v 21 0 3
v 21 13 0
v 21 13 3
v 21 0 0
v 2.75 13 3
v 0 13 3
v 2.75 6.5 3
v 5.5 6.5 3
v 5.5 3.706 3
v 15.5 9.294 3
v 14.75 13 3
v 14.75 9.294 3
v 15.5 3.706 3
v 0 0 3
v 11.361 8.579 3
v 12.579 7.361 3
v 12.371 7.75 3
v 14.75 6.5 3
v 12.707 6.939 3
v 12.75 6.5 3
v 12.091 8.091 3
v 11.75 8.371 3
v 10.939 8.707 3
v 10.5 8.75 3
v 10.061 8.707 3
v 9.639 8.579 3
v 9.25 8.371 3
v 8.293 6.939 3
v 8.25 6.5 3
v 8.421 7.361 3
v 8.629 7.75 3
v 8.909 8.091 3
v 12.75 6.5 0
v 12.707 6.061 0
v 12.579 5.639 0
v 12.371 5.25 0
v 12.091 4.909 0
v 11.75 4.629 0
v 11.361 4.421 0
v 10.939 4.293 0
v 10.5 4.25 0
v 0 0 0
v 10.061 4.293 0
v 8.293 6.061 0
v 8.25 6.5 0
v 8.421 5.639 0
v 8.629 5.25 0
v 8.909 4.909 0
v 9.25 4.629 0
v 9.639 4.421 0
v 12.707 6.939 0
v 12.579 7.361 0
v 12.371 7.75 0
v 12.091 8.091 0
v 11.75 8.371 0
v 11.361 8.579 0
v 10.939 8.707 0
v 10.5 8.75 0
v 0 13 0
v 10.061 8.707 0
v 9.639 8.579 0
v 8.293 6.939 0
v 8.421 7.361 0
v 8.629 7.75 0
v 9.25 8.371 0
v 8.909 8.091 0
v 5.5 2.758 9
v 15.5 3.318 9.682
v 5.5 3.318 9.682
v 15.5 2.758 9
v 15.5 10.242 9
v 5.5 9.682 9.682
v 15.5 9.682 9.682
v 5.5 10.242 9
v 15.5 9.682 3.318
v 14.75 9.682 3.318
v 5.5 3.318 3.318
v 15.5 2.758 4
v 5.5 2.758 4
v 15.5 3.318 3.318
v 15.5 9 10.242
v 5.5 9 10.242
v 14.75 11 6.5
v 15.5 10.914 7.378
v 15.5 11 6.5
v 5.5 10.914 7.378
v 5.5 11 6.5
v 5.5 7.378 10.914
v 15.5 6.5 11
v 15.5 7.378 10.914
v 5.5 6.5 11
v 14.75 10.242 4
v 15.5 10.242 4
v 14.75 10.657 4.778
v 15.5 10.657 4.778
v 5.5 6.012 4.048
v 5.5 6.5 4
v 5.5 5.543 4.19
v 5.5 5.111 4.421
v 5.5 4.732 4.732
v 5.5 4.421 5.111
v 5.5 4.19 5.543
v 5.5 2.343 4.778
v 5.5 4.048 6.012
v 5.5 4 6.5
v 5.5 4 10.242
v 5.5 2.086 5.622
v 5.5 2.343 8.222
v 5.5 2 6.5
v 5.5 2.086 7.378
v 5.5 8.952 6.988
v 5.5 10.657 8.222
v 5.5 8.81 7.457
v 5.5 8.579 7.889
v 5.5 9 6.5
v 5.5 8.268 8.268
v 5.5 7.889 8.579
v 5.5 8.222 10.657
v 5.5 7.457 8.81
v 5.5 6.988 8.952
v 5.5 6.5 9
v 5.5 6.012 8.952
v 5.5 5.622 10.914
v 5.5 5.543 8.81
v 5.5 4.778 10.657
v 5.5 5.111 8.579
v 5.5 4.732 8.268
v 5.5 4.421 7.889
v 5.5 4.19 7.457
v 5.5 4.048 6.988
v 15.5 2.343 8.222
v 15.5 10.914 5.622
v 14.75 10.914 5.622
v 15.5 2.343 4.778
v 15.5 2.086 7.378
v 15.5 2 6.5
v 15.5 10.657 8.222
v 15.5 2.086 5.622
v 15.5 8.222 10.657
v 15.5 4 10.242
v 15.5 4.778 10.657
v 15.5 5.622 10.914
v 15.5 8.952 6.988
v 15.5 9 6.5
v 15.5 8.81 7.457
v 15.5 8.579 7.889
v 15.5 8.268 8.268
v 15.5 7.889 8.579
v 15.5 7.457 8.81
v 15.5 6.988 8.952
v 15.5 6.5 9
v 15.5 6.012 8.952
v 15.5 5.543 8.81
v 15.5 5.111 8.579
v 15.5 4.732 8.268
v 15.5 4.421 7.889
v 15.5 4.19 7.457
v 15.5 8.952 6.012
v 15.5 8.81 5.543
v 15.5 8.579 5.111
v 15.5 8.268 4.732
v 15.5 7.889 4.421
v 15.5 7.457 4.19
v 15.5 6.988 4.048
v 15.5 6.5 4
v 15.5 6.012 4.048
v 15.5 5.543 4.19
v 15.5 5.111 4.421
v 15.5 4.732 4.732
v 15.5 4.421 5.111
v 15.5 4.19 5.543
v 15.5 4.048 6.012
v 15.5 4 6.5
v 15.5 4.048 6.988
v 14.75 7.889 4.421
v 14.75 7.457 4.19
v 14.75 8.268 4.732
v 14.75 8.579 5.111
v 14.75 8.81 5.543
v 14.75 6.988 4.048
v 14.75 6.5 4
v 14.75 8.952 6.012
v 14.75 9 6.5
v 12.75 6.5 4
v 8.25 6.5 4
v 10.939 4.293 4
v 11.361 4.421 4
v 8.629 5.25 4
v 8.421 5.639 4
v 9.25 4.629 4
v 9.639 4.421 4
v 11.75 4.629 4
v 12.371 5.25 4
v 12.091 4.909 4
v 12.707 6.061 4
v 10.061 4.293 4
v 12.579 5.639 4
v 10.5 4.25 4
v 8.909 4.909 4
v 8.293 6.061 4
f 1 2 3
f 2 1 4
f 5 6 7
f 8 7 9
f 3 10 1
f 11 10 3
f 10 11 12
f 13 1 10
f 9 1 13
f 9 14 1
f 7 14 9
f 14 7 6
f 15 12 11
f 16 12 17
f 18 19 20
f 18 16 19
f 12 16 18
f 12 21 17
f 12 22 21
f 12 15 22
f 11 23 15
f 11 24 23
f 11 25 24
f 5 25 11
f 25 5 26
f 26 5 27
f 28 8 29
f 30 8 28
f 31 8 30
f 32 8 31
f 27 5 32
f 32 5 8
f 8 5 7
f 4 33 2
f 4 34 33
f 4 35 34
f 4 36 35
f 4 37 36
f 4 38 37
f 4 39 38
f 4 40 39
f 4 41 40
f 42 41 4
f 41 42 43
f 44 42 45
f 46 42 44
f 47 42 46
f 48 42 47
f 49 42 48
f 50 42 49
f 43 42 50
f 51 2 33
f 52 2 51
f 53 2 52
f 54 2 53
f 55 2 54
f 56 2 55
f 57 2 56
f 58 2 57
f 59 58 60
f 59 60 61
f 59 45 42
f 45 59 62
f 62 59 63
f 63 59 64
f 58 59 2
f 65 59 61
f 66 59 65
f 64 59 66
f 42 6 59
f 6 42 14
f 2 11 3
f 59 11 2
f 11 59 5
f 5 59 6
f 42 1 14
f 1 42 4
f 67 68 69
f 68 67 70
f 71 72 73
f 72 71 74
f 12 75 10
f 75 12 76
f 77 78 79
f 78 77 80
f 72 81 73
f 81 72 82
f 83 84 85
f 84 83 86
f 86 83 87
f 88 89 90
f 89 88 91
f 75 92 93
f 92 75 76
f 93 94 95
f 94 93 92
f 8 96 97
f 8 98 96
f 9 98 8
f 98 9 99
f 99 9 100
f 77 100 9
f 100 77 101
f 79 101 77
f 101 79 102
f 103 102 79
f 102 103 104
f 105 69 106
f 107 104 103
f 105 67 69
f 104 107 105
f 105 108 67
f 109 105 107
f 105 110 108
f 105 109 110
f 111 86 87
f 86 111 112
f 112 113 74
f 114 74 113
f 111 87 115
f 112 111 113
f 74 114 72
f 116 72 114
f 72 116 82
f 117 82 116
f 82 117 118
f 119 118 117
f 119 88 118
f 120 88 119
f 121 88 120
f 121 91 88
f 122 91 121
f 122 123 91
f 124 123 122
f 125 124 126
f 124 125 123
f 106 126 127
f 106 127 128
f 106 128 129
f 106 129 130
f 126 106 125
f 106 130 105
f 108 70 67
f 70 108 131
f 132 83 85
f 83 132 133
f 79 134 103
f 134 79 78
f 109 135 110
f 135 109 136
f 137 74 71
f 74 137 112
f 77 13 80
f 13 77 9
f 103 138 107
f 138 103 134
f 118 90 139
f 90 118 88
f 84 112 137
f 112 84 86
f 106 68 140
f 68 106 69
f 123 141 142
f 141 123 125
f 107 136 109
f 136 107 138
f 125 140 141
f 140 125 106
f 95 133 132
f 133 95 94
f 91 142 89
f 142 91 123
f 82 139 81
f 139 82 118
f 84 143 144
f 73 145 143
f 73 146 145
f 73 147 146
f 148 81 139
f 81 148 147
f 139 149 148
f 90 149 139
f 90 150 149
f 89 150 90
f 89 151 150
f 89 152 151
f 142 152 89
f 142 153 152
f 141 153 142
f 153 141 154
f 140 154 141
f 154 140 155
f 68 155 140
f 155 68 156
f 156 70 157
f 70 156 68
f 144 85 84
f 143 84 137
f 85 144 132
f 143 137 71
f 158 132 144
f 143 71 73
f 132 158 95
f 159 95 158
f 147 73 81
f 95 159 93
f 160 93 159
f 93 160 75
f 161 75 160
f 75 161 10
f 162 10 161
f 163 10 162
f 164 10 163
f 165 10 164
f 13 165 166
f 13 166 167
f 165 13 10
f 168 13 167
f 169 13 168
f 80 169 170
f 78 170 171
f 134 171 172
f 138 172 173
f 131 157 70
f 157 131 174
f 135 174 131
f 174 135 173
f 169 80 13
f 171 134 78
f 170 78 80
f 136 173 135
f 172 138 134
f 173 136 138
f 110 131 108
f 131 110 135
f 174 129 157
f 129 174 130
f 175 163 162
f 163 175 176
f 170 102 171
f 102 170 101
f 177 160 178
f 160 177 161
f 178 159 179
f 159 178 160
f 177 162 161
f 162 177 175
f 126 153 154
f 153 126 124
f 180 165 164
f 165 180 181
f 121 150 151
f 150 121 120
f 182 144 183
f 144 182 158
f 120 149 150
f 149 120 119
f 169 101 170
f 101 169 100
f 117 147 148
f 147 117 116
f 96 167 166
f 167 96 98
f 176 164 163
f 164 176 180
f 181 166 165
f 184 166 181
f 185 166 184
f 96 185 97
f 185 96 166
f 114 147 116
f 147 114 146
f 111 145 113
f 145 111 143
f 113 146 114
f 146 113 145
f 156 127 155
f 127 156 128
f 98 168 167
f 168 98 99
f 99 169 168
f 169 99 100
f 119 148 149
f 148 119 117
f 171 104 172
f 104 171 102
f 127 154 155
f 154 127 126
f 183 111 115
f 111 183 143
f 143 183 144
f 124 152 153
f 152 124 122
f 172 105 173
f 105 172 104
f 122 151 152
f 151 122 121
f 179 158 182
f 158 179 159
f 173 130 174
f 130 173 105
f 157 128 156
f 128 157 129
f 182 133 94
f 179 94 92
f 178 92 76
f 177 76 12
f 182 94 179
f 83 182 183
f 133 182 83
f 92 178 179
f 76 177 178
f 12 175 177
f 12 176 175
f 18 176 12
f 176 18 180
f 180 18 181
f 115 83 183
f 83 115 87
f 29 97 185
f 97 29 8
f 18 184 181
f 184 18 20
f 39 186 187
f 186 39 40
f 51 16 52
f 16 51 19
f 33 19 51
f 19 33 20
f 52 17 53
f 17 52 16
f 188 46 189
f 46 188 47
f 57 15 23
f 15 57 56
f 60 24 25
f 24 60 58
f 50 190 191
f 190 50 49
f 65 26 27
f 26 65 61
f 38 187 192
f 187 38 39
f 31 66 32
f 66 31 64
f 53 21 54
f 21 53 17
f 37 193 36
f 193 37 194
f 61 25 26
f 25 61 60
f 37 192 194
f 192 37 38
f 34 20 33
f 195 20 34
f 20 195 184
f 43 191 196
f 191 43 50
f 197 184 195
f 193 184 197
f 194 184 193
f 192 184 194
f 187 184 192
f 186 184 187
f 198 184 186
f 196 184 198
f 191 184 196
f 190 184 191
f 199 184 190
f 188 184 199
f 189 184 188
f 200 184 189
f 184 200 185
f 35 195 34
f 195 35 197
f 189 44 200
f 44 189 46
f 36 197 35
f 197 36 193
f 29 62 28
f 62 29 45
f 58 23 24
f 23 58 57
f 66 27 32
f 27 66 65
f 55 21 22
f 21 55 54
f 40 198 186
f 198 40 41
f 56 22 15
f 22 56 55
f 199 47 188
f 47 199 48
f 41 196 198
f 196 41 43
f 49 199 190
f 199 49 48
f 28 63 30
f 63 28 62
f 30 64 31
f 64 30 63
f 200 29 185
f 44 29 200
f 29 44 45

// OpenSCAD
$fn = 32;

// ----------------------------------------------------------------------
// Cable clip: cable 5 mm, clamp 9 mm, base 21 mm
// ----------------------------------------------------------------------

// --- parameters (mm) ---
foot_w = 21;              // base length, X
foot_d = 13;              // base width, Y
foot_t = 3;               // base thickness
hose_seat_d = 9;          // clamp outside diameter
ring_t = 2;               // clamp wall
cable_d = 5;              // cable opening
ring_w = 10;              // clamp width along the cable
screw_d = 4.5;            // screw clearance
throat = 3.5;             // snap throat width
sink = 1;                 // overlap of the clamp into the base

module base() {
  cube([foot_w, foot_d, foot_t]);
}

module clamp() {
  translate([foot_w / 2, foot_d / 2, foot_t + hose_seat_d / 2 - sink]) rotate([0, 90, 0])
    cylinder(h = ring_w, d = hose_seat_d, center = true);
}

difference() {
  union() {
    base();
    clamp();
  }
  translate([foot_w / 2, foot_d / 2, foot_t + hose_seat_d / 2 - sink]) rotate([0, 90, 0]) translate([0, 0, -ring_w / 2 - 1]) cylinder(h = ring_w + 2, d = cable_d);
  /* snap throat: the opening is narrower than the cable */
  translate([foot_w / 2 - throat / 2, foot_d / 2, foot_t + hose_seat_d / 2 - sink]) rotate([0, 90, 0]) translate([0, 0, -ring_w / 2 - 1]) cube([throat, hose_seat_d + 2, ring_w + 2]);
  translate([10.5, foot_d / 2, -1]) cylinder(h = foot_t + 2, d = screw_d);
}
